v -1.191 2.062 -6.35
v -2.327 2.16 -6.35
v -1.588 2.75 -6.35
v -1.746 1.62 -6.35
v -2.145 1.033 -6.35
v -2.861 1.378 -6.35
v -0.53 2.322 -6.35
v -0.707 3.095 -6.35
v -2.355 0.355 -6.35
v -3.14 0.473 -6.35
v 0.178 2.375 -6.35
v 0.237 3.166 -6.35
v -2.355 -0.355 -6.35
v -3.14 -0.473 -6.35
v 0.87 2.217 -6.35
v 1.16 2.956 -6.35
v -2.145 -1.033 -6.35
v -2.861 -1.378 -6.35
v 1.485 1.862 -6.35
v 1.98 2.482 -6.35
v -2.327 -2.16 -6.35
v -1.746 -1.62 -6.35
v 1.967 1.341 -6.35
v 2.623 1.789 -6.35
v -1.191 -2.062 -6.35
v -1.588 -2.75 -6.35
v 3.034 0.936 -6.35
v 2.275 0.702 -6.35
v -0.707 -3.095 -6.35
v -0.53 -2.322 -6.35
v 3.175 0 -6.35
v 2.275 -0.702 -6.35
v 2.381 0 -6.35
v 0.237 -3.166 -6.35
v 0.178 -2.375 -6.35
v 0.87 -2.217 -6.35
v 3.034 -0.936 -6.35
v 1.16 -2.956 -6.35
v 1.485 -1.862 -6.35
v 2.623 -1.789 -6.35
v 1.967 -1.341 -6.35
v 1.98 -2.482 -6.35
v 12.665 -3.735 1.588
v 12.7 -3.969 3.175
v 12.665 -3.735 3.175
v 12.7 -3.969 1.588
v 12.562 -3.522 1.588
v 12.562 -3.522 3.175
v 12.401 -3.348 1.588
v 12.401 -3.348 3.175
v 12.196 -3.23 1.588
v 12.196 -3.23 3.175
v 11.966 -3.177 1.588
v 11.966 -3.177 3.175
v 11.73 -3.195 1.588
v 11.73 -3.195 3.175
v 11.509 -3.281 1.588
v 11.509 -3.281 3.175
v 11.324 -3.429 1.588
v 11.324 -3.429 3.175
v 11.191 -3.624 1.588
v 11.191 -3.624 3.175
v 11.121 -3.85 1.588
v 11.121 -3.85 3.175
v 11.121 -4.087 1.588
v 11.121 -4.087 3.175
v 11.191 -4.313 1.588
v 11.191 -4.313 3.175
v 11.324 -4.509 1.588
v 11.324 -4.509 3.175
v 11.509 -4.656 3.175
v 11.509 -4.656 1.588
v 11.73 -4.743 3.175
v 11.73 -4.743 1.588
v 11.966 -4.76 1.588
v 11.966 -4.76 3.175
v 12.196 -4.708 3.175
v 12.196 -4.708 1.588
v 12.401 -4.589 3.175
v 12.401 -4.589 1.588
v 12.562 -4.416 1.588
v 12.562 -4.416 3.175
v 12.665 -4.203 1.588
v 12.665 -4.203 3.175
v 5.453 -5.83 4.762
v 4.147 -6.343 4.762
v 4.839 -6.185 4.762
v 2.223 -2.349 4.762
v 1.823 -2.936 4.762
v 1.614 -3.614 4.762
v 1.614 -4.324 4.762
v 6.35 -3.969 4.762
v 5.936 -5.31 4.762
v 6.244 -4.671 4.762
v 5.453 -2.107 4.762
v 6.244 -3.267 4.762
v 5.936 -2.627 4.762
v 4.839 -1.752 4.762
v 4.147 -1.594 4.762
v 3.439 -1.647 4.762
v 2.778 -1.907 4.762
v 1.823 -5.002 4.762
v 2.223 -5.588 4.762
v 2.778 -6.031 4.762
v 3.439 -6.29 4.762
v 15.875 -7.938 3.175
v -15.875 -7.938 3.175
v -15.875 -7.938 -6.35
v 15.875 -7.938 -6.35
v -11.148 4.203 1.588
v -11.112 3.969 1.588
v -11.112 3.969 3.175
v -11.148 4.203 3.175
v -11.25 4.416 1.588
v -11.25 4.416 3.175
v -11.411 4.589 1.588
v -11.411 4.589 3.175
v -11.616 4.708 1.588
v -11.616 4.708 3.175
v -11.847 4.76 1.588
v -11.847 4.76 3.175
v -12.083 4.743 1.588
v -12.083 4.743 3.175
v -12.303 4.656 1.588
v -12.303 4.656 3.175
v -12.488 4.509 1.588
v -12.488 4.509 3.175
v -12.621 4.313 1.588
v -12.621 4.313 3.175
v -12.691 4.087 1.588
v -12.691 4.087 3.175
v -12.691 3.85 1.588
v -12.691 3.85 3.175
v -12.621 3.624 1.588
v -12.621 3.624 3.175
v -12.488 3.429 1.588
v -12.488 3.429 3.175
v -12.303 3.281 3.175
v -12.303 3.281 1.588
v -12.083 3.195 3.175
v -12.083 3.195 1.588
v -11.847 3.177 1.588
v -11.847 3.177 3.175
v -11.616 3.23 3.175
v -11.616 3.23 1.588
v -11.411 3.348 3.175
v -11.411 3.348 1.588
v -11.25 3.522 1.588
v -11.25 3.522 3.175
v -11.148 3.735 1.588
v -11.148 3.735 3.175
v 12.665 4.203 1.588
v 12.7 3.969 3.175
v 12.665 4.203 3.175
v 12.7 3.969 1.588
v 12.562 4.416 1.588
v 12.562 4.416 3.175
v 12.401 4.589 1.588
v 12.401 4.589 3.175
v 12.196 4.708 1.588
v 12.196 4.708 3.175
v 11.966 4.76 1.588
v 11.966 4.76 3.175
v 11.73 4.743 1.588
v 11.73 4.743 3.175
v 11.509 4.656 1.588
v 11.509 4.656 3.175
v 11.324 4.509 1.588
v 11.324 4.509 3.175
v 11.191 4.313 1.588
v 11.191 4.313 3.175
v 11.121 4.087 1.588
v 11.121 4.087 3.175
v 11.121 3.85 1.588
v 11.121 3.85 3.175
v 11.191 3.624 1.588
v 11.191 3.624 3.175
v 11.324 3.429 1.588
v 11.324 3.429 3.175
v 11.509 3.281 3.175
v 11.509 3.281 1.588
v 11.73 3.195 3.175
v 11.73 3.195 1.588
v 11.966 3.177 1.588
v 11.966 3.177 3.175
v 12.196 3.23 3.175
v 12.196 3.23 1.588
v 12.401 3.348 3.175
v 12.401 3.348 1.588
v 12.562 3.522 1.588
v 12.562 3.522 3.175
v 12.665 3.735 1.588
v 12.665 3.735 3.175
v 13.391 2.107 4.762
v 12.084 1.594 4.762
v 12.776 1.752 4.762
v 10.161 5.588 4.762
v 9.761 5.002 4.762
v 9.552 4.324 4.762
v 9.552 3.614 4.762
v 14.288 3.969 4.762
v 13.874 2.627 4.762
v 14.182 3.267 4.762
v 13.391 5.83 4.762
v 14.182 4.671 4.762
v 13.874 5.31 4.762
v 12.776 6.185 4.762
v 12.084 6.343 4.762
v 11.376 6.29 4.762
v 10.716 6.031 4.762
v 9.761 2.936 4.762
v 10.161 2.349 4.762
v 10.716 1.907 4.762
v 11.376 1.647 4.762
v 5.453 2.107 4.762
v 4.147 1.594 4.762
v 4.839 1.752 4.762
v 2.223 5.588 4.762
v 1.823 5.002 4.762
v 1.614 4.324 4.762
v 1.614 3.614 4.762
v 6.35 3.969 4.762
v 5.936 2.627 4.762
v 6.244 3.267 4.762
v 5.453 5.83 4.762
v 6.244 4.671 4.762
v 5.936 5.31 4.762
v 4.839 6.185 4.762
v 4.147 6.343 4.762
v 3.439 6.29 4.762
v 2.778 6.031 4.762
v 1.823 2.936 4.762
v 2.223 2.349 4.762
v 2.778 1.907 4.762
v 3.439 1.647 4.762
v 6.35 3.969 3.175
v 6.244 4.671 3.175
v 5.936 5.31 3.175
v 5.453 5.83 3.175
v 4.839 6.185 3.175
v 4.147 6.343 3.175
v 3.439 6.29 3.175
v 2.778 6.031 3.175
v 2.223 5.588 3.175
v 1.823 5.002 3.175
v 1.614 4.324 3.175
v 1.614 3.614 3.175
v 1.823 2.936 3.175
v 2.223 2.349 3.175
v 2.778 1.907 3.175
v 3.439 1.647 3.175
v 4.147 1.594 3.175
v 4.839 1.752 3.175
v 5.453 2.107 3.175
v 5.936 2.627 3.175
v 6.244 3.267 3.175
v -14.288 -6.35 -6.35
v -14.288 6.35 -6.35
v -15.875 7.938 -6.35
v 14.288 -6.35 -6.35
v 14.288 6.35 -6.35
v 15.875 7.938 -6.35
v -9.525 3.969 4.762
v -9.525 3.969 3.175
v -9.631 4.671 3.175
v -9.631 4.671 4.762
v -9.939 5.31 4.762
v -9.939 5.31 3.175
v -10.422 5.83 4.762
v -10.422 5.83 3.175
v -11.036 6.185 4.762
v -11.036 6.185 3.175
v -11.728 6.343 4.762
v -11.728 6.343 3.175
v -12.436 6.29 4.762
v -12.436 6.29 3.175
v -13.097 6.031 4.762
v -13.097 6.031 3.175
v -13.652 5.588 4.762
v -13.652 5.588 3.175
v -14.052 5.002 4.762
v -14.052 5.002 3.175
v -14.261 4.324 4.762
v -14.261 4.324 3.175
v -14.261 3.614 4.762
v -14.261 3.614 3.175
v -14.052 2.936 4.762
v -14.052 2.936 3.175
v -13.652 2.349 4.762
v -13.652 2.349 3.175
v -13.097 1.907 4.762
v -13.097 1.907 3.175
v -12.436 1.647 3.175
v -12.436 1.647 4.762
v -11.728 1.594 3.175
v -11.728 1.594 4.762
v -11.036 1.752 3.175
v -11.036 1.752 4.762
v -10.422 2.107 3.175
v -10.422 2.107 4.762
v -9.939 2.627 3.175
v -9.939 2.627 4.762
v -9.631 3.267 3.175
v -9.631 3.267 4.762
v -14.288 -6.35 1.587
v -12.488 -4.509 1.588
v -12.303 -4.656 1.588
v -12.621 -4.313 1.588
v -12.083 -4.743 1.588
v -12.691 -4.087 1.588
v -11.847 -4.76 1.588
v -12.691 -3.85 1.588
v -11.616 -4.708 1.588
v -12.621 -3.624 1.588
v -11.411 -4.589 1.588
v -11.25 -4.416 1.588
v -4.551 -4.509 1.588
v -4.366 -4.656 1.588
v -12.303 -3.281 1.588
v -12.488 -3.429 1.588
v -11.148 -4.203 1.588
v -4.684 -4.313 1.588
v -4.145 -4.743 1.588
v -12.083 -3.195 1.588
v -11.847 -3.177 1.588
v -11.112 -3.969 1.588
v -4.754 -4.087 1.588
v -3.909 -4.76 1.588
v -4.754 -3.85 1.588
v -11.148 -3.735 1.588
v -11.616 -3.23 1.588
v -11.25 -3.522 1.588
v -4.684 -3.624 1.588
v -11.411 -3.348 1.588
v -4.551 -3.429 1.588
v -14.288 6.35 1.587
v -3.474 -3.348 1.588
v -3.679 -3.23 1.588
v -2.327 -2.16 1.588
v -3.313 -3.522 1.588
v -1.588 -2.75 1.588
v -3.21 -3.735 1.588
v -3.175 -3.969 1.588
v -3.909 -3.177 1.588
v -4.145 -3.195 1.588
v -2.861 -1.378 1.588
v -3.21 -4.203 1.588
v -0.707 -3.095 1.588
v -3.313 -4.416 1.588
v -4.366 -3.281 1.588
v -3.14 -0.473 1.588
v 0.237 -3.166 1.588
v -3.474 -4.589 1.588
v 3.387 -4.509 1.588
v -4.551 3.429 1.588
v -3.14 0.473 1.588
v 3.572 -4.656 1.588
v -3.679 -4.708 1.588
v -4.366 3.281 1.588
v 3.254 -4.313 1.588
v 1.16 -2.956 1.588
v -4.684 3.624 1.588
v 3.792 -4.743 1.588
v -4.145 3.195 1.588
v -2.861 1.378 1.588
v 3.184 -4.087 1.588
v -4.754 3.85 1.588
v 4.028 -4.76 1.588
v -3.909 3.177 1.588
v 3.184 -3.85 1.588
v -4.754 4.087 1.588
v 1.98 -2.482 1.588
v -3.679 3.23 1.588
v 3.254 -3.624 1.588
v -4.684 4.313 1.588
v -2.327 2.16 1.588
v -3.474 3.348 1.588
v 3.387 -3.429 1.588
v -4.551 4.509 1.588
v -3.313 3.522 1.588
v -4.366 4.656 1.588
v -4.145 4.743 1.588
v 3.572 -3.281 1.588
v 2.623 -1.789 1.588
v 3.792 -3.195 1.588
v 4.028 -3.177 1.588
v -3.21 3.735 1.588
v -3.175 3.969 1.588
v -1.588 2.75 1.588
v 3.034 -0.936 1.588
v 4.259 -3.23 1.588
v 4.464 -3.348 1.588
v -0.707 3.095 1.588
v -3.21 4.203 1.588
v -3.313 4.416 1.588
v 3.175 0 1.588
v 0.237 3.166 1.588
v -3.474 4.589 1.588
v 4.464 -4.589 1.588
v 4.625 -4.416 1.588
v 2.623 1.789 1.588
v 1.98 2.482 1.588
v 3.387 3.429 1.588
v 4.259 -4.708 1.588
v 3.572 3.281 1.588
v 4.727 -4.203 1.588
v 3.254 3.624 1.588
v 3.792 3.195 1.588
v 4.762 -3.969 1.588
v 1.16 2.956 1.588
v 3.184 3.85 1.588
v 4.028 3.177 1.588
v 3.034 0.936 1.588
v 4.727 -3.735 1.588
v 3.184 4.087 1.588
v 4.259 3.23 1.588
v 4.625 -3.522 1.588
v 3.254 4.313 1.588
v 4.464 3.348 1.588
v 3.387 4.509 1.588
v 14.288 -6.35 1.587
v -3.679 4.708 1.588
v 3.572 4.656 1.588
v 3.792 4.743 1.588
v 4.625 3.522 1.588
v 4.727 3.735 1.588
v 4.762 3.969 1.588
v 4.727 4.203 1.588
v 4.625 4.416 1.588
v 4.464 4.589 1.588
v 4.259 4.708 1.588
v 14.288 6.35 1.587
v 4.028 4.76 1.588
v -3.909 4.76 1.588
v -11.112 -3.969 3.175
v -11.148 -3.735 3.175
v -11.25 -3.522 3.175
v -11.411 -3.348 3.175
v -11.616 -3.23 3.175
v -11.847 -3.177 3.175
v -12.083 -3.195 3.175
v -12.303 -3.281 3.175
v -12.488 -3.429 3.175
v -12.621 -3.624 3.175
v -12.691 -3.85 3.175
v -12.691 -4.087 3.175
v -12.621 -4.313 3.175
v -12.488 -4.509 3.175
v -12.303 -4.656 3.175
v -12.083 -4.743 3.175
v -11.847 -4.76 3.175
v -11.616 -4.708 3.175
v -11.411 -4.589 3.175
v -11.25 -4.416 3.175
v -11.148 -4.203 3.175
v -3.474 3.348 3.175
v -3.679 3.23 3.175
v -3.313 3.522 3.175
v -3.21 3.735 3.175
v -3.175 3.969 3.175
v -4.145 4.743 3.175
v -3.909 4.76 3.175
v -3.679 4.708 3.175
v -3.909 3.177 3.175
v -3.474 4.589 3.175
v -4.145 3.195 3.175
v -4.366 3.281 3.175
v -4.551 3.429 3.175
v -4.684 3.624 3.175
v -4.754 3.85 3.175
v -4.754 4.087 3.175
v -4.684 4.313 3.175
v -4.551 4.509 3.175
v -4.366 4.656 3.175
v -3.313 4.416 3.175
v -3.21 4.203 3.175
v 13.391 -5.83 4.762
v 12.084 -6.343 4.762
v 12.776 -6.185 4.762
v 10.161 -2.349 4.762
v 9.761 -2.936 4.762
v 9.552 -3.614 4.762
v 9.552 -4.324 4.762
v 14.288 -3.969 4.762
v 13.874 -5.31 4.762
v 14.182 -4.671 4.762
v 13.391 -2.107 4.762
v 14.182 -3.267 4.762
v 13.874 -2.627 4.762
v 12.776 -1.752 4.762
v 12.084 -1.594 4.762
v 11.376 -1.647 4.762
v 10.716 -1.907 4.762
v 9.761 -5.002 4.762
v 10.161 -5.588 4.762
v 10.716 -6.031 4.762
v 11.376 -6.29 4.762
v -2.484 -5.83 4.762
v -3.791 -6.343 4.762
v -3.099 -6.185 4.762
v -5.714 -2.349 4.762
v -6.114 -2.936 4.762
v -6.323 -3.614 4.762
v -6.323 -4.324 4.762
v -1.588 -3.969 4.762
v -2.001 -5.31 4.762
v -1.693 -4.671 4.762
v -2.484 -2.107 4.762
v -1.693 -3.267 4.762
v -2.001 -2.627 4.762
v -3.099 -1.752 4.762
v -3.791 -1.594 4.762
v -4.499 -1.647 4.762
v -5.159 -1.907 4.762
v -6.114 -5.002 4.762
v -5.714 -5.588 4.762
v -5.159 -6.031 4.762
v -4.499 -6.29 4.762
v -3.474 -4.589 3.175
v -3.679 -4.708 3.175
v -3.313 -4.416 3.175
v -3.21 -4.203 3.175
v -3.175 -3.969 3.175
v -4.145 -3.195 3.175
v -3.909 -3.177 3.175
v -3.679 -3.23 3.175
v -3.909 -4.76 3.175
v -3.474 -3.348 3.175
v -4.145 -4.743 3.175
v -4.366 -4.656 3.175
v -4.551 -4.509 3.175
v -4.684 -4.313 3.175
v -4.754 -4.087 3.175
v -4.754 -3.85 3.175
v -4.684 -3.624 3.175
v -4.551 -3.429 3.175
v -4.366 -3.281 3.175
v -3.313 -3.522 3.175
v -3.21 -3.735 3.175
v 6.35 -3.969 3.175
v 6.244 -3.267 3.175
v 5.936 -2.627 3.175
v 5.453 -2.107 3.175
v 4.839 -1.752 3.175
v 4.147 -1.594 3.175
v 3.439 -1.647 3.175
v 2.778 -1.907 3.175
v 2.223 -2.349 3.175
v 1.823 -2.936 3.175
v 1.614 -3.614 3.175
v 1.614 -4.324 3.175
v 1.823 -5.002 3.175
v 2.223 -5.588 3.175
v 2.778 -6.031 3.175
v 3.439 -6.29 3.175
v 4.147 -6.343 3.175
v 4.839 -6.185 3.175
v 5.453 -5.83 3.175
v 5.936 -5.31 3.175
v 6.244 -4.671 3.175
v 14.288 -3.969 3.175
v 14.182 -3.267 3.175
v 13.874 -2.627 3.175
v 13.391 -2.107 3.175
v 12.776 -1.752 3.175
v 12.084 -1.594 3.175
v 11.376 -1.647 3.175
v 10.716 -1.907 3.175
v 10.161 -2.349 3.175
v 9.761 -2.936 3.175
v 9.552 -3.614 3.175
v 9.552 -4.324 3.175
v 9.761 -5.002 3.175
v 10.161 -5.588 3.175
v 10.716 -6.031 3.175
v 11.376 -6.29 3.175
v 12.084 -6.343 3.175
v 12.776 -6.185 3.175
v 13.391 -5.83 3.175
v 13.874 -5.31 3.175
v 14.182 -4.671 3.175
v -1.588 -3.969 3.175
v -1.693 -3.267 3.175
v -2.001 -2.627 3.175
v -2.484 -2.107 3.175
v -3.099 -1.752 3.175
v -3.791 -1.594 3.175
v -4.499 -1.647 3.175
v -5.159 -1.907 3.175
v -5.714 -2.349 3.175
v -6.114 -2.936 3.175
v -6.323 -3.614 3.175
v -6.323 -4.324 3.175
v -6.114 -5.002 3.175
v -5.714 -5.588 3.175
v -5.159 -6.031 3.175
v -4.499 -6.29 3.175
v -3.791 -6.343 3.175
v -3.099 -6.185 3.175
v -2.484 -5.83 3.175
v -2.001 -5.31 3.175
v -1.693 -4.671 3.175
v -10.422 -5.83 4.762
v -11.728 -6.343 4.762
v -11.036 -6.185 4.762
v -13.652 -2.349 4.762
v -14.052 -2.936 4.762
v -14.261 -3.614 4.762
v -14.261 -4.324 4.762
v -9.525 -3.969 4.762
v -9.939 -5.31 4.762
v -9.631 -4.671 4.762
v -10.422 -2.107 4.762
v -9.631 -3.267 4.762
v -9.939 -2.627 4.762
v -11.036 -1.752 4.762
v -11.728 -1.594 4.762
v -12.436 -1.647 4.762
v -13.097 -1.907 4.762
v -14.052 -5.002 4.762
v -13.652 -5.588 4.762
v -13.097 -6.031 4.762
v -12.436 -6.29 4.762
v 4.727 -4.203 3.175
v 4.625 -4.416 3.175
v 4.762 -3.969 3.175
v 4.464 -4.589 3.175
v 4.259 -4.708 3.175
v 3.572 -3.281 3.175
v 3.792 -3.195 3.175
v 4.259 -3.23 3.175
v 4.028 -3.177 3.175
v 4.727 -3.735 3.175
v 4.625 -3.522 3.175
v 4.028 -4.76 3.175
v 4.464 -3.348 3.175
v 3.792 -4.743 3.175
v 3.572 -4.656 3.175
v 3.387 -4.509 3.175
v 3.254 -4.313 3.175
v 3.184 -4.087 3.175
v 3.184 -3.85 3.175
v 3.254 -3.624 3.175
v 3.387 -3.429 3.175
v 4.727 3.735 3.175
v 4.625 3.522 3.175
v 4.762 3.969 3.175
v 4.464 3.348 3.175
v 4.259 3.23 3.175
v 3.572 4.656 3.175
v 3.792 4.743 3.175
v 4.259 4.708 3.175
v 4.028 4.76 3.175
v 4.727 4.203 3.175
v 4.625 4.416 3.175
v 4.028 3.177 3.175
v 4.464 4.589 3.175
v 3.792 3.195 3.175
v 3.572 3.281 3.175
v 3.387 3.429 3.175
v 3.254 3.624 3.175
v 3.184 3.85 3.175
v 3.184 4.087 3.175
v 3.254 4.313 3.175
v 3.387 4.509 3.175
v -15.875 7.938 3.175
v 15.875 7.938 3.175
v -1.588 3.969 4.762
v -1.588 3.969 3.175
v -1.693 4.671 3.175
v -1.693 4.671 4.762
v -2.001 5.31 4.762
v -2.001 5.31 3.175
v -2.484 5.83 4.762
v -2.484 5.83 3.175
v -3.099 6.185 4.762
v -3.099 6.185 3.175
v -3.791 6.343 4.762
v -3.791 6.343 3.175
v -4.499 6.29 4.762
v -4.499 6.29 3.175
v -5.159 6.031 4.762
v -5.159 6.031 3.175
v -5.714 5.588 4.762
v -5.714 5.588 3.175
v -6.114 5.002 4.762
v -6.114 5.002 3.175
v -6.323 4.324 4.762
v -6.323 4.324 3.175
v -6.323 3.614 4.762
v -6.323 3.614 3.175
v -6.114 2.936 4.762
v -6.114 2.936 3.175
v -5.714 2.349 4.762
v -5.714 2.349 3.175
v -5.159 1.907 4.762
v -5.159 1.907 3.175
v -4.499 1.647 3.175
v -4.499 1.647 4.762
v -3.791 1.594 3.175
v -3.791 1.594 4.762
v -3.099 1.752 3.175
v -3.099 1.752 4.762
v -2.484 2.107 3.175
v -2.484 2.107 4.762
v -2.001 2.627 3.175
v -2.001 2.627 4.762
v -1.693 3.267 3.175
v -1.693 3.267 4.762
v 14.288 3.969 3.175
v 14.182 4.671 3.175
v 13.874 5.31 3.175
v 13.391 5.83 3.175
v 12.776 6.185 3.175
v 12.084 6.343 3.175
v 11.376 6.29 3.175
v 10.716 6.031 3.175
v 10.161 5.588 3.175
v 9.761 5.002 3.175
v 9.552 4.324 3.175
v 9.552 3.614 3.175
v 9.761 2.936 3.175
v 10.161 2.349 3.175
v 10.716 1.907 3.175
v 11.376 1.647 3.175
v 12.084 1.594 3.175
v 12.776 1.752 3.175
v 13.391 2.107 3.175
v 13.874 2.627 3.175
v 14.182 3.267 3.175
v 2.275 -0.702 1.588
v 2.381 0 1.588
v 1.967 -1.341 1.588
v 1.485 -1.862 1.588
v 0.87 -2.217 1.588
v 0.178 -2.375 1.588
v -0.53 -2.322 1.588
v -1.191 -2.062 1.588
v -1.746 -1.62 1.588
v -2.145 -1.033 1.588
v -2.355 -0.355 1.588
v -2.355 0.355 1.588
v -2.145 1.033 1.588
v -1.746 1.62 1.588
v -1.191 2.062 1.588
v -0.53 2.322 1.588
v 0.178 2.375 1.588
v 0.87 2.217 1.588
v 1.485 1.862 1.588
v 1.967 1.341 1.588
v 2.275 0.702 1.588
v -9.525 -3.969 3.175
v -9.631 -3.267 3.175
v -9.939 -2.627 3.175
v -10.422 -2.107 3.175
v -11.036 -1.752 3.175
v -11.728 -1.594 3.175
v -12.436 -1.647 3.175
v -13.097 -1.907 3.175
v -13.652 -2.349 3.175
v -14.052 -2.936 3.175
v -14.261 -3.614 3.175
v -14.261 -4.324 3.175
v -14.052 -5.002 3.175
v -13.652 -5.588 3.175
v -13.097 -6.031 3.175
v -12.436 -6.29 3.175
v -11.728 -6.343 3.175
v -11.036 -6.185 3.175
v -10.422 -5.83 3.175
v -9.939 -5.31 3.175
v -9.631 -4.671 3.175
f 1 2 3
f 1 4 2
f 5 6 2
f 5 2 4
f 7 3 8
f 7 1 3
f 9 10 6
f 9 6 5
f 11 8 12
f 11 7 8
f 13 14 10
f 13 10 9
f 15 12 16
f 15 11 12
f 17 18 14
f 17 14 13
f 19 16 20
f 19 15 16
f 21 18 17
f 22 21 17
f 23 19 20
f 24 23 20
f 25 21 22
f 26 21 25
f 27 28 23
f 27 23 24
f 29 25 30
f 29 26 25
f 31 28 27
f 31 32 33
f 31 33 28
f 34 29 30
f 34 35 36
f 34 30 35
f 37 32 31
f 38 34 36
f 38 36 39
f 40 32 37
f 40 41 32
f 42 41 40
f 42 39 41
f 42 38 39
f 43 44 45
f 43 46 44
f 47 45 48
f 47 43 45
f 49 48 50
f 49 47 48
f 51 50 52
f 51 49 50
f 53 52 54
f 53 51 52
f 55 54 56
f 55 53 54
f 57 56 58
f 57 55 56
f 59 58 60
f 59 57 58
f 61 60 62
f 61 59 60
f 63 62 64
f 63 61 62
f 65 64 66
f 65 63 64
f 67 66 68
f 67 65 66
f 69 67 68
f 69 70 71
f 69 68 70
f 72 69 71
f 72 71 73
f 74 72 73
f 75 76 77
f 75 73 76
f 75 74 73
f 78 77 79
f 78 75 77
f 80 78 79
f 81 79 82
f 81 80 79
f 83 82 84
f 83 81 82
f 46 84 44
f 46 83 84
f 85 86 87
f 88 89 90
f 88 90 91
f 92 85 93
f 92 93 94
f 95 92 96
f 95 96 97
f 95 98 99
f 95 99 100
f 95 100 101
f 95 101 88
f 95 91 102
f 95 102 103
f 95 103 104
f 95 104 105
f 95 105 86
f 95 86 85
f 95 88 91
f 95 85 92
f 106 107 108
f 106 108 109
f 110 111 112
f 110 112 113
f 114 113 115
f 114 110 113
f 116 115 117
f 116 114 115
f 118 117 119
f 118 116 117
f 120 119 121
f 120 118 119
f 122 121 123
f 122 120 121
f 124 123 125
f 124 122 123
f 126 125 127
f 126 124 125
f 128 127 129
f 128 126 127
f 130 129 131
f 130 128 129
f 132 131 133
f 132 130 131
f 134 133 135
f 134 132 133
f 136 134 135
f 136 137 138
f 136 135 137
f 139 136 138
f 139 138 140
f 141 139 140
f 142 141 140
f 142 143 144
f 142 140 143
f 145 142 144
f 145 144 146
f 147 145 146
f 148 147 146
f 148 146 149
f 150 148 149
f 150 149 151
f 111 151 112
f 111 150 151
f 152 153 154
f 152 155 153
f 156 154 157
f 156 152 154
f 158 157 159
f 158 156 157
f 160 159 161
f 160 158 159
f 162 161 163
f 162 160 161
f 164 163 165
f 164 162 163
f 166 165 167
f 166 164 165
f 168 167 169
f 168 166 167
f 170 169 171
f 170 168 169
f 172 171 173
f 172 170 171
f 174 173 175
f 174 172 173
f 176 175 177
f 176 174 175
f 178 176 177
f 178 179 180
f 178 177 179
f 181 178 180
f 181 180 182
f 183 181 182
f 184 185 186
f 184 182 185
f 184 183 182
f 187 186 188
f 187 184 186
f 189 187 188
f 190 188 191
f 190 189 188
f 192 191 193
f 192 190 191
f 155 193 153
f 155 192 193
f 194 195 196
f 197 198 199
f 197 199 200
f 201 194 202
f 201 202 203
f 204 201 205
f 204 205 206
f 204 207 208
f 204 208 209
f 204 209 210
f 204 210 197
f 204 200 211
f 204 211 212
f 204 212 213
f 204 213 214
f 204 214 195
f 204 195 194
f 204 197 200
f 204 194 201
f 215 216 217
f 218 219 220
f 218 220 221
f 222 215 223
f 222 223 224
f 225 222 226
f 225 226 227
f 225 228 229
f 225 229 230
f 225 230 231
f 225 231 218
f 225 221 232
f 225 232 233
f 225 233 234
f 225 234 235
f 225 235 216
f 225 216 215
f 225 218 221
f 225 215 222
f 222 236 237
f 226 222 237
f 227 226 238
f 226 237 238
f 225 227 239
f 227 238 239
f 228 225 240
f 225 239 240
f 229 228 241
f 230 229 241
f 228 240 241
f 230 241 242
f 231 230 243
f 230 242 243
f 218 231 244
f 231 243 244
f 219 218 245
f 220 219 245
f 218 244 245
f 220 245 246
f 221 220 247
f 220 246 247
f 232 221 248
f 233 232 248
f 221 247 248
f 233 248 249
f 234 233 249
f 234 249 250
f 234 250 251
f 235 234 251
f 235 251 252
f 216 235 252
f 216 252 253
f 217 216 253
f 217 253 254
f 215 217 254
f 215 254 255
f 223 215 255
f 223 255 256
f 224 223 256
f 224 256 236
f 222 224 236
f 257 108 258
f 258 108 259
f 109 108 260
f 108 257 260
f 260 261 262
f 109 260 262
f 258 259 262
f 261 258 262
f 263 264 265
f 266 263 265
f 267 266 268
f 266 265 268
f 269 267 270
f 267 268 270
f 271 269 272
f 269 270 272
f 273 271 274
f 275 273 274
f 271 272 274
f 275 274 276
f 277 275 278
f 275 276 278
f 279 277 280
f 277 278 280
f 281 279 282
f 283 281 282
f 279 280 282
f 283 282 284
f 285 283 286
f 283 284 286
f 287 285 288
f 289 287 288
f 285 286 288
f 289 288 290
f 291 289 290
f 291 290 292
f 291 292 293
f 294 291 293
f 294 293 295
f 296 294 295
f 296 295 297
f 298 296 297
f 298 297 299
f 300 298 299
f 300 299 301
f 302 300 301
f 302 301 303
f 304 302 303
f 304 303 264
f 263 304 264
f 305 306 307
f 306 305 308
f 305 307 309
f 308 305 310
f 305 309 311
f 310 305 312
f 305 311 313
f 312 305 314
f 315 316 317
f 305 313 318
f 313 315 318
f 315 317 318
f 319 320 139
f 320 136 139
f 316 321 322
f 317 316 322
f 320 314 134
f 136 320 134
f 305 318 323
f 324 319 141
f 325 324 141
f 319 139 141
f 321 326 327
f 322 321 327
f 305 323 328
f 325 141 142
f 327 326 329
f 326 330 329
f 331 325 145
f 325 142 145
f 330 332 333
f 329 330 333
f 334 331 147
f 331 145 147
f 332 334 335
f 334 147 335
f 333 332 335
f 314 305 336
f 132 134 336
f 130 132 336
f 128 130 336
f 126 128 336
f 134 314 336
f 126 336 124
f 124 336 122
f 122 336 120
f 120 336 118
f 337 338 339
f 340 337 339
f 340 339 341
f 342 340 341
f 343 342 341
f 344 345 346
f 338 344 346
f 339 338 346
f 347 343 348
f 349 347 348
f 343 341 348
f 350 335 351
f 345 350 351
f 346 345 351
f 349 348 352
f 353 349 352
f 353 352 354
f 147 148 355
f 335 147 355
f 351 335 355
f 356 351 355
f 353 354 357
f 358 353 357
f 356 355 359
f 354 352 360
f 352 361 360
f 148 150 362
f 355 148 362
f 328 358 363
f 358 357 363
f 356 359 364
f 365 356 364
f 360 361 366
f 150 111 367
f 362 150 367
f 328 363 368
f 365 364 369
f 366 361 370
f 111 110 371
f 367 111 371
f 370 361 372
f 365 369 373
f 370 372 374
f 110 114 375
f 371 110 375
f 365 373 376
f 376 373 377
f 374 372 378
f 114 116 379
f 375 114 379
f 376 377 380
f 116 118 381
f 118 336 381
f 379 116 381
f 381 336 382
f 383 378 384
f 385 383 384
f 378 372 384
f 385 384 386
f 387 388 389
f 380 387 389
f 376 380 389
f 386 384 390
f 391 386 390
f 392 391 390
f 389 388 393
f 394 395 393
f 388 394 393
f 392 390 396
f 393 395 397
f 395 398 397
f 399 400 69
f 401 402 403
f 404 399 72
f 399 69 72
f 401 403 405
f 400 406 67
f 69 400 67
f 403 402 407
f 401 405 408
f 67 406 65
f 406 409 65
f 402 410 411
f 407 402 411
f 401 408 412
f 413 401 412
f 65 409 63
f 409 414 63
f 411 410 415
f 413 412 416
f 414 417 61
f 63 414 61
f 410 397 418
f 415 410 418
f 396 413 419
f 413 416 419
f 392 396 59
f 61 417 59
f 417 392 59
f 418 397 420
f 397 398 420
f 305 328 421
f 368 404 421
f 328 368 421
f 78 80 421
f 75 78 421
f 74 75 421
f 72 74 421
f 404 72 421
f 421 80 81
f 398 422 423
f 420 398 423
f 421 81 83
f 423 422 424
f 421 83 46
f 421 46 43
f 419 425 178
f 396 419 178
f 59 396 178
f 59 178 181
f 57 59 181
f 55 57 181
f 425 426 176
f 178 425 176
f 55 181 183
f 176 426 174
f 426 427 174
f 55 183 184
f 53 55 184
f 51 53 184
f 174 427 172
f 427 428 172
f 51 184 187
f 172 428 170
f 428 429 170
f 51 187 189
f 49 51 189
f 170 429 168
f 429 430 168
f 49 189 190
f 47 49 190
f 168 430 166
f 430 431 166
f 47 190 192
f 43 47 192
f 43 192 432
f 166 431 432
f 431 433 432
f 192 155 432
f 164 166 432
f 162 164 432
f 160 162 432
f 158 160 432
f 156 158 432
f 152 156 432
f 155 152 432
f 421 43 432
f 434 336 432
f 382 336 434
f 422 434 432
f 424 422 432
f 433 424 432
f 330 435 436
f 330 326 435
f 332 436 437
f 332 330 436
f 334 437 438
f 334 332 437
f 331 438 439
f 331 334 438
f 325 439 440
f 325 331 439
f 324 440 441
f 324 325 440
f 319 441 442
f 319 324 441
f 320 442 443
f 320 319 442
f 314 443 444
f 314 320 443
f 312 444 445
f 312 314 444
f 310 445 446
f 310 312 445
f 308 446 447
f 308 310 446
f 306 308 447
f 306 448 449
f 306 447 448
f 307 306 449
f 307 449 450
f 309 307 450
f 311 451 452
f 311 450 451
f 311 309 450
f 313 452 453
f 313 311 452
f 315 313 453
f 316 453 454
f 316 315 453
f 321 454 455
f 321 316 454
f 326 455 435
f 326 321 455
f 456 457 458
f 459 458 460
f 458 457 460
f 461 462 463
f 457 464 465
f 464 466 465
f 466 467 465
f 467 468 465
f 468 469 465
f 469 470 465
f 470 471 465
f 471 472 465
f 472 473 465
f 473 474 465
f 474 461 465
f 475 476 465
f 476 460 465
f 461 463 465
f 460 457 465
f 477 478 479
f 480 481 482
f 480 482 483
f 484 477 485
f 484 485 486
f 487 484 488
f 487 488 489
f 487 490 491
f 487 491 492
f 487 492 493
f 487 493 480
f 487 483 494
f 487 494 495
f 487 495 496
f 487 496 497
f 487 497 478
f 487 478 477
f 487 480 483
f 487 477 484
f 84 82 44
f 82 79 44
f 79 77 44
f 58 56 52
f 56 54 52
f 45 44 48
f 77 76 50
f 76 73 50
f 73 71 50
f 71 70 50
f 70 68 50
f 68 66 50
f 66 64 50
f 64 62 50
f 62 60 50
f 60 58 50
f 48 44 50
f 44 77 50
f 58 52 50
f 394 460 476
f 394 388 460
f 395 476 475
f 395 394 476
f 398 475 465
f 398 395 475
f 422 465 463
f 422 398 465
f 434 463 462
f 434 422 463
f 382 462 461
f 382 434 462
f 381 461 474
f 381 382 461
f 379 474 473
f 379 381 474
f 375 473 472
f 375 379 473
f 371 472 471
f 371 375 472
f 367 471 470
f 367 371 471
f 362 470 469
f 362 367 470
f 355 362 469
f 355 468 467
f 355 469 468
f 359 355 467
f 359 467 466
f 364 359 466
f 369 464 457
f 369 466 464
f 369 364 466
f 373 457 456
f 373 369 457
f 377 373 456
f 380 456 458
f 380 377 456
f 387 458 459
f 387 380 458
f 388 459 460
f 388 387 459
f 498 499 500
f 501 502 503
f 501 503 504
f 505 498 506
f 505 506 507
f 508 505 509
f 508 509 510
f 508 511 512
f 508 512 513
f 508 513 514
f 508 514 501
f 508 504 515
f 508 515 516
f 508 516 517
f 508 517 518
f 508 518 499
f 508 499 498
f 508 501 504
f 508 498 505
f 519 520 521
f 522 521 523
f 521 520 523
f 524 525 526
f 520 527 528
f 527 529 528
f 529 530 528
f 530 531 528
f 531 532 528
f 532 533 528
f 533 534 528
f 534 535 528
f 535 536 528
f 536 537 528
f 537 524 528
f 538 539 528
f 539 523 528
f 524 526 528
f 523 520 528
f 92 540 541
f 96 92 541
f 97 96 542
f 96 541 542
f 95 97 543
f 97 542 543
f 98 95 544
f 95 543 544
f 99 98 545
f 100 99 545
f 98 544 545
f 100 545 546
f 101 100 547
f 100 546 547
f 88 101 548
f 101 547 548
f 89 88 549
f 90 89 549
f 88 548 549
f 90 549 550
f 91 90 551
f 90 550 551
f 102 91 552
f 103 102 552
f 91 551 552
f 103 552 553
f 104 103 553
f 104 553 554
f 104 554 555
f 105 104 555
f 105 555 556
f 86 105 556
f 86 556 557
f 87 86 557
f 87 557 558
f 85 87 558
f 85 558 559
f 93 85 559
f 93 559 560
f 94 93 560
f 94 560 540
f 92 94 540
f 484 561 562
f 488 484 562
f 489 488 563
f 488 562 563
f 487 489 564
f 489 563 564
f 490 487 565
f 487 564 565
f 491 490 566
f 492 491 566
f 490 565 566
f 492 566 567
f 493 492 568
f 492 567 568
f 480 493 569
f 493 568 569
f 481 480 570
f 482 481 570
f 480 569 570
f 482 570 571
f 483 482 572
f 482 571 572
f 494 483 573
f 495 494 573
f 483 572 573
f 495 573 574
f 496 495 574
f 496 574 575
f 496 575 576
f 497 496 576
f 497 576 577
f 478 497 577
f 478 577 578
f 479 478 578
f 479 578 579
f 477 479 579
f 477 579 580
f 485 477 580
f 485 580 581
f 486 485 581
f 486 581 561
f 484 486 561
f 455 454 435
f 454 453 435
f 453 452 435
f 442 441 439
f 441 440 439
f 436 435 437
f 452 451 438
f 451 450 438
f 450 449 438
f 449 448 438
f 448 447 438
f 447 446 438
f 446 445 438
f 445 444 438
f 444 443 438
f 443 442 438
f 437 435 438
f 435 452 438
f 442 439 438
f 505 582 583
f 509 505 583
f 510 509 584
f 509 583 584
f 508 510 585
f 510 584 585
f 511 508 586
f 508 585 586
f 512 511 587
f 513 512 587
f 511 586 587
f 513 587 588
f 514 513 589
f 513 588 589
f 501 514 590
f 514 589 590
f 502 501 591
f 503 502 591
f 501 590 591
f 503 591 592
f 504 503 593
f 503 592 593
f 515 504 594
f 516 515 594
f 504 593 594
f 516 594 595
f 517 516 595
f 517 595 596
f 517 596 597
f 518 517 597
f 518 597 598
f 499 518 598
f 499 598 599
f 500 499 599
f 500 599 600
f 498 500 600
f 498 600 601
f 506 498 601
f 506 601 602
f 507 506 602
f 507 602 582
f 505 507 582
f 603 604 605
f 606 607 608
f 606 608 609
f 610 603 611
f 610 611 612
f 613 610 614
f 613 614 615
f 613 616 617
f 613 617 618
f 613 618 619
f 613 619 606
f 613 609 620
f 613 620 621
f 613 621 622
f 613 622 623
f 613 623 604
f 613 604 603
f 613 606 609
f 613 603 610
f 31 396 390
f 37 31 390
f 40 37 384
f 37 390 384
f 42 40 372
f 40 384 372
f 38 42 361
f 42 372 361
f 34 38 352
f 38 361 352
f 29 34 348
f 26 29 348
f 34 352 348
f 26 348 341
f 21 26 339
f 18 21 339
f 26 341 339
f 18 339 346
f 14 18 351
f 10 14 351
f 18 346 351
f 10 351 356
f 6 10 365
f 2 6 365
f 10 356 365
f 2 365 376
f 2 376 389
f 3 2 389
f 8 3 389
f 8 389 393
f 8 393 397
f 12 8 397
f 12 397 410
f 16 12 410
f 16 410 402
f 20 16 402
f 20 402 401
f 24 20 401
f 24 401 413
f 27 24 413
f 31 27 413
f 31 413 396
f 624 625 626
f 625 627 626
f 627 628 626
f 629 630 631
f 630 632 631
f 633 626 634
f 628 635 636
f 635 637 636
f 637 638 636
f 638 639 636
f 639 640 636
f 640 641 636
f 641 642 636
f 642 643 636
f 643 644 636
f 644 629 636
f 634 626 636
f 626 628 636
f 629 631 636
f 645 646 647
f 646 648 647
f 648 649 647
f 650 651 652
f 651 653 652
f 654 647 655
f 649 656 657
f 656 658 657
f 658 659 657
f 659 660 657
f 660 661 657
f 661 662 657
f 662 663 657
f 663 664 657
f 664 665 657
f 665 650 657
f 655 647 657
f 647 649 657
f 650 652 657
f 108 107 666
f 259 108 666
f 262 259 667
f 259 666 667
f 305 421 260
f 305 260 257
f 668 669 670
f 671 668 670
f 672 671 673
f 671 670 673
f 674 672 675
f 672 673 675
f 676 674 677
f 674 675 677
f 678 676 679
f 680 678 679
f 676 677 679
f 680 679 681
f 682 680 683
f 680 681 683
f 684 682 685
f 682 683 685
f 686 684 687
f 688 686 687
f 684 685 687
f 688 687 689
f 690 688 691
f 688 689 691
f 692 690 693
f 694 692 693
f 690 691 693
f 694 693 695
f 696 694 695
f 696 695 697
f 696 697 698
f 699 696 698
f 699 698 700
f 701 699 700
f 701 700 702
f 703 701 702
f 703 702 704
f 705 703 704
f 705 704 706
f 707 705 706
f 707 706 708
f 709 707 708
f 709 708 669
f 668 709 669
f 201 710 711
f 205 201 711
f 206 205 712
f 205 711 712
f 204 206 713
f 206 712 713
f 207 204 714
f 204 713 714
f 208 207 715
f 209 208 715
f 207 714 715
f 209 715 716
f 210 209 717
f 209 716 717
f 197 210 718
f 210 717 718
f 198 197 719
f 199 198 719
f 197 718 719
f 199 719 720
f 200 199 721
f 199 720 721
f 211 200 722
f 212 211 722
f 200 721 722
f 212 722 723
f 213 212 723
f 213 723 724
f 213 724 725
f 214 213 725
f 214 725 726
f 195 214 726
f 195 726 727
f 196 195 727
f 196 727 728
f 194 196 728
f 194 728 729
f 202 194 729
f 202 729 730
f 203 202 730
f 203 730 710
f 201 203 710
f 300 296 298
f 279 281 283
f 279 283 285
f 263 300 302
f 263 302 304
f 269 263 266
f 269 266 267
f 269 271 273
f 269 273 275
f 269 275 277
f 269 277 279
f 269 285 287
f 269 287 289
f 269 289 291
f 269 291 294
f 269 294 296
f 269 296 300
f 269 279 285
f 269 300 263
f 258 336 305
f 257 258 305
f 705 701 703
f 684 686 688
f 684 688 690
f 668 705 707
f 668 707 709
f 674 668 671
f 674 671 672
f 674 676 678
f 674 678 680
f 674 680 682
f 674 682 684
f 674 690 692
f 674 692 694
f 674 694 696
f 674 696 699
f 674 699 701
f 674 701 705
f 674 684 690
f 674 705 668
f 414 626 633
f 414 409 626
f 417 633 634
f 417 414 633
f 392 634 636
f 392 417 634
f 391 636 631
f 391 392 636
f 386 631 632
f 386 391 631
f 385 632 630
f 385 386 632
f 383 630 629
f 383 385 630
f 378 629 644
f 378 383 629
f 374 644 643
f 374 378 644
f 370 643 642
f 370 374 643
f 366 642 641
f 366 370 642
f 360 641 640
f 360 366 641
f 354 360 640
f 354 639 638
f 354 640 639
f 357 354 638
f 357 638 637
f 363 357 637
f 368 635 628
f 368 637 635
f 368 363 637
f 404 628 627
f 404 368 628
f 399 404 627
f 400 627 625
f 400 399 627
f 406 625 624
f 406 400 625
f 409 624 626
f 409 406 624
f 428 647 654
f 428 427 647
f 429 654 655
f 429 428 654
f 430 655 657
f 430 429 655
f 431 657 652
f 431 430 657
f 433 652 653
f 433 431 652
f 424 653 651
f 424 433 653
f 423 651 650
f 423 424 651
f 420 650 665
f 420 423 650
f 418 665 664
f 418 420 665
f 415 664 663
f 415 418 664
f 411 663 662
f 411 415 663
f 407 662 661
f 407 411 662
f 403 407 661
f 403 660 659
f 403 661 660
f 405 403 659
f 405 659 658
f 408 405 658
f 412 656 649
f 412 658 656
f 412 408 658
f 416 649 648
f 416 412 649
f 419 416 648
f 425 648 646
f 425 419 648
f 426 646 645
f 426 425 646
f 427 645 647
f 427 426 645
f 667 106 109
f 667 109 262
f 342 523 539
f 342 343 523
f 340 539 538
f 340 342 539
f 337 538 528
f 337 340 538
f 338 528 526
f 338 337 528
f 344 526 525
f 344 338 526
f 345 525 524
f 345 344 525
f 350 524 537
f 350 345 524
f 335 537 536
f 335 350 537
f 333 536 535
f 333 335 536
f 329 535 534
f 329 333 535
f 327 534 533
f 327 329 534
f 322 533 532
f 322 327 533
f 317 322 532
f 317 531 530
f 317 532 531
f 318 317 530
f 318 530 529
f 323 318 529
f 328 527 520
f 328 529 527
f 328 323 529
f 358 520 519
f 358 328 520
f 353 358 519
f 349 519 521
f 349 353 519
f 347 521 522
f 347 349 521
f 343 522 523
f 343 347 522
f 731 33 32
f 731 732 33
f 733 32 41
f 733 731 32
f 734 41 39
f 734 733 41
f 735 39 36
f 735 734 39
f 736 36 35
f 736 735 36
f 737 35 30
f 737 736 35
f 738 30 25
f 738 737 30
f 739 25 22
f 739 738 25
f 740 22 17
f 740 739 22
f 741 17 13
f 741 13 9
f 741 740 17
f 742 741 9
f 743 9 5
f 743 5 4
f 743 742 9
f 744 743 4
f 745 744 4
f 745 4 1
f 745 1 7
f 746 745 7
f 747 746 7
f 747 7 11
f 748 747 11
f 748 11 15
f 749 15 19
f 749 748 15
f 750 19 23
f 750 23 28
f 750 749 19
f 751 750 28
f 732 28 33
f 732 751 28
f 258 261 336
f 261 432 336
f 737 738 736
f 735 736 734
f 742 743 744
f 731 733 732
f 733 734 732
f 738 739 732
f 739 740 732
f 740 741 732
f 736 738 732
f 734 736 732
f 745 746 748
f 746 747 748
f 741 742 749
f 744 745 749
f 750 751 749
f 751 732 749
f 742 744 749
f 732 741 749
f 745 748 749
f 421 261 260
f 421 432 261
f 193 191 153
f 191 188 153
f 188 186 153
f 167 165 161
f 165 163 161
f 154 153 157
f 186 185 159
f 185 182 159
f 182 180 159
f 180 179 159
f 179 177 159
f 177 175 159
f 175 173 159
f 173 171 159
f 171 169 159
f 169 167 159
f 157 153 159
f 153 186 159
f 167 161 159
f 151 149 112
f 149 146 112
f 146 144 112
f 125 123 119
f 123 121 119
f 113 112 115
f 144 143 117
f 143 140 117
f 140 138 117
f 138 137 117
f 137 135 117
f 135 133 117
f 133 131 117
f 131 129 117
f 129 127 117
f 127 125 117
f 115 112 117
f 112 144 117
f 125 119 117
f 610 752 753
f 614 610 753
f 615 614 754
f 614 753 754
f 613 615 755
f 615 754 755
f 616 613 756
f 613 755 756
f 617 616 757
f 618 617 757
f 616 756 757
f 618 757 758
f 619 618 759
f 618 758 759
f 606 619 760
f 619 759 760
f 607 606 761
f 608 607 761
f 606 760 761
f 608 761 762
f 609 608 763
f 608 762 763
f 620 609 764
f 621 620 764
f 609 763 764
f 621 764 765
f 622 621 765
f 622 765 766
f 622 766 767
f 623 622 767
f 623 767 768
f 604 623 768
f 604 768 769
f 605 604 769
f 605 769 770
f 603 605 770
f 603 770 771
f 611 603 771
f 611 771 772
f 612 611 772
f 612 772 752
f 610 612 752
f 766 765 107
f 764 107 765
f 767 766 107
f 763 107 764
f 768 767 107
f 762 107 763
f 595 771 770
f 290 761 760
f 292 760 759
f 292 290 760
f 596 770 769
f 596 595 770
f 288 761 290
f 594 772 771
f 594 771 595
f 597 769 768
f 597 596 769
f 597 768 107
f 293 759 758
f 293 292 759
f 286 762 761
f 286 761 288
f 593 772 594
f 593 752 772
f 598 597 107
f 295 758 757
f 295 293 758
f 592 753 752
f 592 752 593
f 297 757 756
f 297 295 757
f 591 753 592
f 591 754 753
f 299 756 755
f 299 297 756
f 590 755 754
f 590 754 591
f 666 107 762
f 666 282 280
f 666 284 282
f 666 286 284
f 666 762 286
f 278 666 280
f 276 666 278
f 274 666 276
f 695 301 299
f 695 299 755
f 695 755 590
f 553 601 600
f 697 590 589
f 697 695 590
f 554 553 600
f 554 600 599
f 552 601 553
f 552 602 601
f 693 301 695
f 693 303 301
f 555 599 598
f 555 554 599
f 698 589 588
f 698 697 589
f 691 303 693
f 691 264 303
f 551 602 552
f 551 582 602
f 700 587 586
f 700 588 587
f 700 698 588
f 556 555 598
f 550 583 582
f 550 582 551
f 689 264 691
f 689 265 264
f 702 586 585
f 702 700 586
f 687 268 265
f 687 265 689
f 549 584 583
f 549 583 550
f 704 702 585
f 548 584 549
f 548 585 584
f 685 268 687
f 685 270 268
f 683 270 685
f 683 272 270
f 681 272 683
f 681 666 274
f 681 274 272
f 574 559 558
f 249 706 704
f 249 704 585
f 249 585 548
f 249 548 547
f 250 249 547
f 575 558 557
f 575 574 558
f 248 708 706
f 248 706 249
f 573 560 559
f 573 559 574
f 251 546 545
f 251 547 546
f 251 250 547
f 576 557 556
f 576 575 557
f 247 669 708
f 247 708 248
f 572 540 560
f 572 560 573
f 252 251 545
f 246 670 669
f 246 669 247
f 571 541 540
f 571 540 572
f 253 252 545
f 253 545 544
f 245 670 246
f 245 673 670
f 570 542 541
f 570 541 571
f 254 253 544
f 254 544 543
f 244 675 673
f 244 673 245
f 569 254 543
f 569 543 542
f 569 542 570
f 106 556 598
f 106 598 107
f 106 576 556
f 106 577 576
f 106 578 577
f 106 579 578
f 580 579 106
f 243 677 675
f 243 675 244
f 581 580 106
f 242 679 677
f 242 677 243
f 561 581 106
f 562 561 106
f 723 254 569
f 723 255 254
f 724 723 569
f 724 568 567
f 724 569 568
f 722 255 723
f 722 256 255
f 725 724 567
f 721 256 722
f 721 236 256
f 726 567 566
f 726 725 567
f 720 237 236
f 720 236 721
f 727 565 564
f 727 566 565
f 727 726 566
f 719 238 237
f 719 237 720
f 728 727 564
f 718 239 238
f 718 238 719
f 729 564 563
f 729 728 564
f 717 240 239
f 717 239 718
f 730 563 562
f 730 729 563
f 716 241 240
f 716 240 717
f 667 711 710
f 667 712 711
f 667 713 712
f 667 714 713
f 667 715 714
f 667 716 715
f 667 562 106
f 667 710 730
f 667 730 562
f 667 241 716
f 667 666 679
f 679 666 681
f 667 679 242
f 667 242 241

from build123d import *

# Parameters (mm, degrees)
F0_W     = 31.75
F0_H     = 15.875
F0_R     = 2.38125
F1_DEPTH = 3.175
F2_DEPTH = 4.7625
F3_T     = -1.5875
F4_R     = 3.175
F4_R_2   = 2.38125
F5_DEPTH = 1.5875
F6_DEPTH = 6.35


with BuildPart() as f1:
    # F0 (on Top) → F1 (new body)
    with BuildSketch(Plane.XY):
        Rectangle(F0_W, F0_H)
        with Locations((-11.90625, -3.96875)):
            Circle(F0_R, mode=Mode.SUBTRACT)
        with Locations((-3.96875, -3.96875)):
            Circle(F0_R, mode=Mode.SUBTRACT)
        with Locations((3.96875, -3.96875)):
            Circle(F0_R, mode=Mode.SUBTRACT)
        with Locations((11.90625, -3.96875)):
            Circle(F0_R, mode=Mode.SUBTRACT)
        with Locations((-11.90625, 3.96875)):
            Circle(F0_R, mode=Mode.SUBTRACT)
        with Locations((-3.96875, 3.96875)):
            Circle(F0_R, mode=Mode.SUBTRACT)
        with Locations((3.96875, 3.96875)):
            Circle(F0_R, mode=Mode.SUBTRACT)
        with Locations((11.90625, 3.96875)):
            Circle(F0_R, mode=Mode.SUBTRACT)
    extrude(amount=F1_DEPTH)

    # F0 (on Top) → F2 (join)
    with BuildSketch(Plane.XY):
        with Locations((-11.90625, 3.96875)):
            Circle(F0_R)
        with Locations((-3.96875, 3.96875)):
            Circle(F0_R)
        with Locations((-3.96875, -3.96875)):
            Circle(F0_R)
        with Locations((-11.90625, -3.96875)):
            Circle(F0_R)
        with Locations((3.96875, 3.96875)):
            Circle(F0_R)
        with Locations((11.90625, 3.96875)):
            Circle(F0_R)
        with Locations((11.90625, -3.96875)):
            Circle(F0_R)
        with Locations((3.96875, -3.96875)):
            Circle(F0_R)
    extrude(amount=F2_DEPTH)

    # F3
    f3_openings = [f1.faces().sort_by_distance(p)[0] for p in [
        (0, 0, 0),
    ]]
    offset(amount=F3_T, openings=f3_openings, kind=Kind.INTERSECTION)

    # F4 (on face) → F5 (join)
    with BuildSketch(Plane(origin=(0, 0, 1.5875), x_dir=(1, 0, 0), z_dir=(0, 0, -1))):
        Circle(F4_R)
        Circle(F4_R_2, mode=Mode.SUBTRACT)
    extrude(amount=F5_DEPTH)

    # F6 (add): faces of the model
    f6_faces = [f1.faces().sort_by_distance(p)[0] for p in [
        (0, 7.5825242086, 0),
        (-3.0851974388, 0, 0),
    ]]
    extrude(f6_faces, amount=F6_DEPTH)


solid = f1.part
